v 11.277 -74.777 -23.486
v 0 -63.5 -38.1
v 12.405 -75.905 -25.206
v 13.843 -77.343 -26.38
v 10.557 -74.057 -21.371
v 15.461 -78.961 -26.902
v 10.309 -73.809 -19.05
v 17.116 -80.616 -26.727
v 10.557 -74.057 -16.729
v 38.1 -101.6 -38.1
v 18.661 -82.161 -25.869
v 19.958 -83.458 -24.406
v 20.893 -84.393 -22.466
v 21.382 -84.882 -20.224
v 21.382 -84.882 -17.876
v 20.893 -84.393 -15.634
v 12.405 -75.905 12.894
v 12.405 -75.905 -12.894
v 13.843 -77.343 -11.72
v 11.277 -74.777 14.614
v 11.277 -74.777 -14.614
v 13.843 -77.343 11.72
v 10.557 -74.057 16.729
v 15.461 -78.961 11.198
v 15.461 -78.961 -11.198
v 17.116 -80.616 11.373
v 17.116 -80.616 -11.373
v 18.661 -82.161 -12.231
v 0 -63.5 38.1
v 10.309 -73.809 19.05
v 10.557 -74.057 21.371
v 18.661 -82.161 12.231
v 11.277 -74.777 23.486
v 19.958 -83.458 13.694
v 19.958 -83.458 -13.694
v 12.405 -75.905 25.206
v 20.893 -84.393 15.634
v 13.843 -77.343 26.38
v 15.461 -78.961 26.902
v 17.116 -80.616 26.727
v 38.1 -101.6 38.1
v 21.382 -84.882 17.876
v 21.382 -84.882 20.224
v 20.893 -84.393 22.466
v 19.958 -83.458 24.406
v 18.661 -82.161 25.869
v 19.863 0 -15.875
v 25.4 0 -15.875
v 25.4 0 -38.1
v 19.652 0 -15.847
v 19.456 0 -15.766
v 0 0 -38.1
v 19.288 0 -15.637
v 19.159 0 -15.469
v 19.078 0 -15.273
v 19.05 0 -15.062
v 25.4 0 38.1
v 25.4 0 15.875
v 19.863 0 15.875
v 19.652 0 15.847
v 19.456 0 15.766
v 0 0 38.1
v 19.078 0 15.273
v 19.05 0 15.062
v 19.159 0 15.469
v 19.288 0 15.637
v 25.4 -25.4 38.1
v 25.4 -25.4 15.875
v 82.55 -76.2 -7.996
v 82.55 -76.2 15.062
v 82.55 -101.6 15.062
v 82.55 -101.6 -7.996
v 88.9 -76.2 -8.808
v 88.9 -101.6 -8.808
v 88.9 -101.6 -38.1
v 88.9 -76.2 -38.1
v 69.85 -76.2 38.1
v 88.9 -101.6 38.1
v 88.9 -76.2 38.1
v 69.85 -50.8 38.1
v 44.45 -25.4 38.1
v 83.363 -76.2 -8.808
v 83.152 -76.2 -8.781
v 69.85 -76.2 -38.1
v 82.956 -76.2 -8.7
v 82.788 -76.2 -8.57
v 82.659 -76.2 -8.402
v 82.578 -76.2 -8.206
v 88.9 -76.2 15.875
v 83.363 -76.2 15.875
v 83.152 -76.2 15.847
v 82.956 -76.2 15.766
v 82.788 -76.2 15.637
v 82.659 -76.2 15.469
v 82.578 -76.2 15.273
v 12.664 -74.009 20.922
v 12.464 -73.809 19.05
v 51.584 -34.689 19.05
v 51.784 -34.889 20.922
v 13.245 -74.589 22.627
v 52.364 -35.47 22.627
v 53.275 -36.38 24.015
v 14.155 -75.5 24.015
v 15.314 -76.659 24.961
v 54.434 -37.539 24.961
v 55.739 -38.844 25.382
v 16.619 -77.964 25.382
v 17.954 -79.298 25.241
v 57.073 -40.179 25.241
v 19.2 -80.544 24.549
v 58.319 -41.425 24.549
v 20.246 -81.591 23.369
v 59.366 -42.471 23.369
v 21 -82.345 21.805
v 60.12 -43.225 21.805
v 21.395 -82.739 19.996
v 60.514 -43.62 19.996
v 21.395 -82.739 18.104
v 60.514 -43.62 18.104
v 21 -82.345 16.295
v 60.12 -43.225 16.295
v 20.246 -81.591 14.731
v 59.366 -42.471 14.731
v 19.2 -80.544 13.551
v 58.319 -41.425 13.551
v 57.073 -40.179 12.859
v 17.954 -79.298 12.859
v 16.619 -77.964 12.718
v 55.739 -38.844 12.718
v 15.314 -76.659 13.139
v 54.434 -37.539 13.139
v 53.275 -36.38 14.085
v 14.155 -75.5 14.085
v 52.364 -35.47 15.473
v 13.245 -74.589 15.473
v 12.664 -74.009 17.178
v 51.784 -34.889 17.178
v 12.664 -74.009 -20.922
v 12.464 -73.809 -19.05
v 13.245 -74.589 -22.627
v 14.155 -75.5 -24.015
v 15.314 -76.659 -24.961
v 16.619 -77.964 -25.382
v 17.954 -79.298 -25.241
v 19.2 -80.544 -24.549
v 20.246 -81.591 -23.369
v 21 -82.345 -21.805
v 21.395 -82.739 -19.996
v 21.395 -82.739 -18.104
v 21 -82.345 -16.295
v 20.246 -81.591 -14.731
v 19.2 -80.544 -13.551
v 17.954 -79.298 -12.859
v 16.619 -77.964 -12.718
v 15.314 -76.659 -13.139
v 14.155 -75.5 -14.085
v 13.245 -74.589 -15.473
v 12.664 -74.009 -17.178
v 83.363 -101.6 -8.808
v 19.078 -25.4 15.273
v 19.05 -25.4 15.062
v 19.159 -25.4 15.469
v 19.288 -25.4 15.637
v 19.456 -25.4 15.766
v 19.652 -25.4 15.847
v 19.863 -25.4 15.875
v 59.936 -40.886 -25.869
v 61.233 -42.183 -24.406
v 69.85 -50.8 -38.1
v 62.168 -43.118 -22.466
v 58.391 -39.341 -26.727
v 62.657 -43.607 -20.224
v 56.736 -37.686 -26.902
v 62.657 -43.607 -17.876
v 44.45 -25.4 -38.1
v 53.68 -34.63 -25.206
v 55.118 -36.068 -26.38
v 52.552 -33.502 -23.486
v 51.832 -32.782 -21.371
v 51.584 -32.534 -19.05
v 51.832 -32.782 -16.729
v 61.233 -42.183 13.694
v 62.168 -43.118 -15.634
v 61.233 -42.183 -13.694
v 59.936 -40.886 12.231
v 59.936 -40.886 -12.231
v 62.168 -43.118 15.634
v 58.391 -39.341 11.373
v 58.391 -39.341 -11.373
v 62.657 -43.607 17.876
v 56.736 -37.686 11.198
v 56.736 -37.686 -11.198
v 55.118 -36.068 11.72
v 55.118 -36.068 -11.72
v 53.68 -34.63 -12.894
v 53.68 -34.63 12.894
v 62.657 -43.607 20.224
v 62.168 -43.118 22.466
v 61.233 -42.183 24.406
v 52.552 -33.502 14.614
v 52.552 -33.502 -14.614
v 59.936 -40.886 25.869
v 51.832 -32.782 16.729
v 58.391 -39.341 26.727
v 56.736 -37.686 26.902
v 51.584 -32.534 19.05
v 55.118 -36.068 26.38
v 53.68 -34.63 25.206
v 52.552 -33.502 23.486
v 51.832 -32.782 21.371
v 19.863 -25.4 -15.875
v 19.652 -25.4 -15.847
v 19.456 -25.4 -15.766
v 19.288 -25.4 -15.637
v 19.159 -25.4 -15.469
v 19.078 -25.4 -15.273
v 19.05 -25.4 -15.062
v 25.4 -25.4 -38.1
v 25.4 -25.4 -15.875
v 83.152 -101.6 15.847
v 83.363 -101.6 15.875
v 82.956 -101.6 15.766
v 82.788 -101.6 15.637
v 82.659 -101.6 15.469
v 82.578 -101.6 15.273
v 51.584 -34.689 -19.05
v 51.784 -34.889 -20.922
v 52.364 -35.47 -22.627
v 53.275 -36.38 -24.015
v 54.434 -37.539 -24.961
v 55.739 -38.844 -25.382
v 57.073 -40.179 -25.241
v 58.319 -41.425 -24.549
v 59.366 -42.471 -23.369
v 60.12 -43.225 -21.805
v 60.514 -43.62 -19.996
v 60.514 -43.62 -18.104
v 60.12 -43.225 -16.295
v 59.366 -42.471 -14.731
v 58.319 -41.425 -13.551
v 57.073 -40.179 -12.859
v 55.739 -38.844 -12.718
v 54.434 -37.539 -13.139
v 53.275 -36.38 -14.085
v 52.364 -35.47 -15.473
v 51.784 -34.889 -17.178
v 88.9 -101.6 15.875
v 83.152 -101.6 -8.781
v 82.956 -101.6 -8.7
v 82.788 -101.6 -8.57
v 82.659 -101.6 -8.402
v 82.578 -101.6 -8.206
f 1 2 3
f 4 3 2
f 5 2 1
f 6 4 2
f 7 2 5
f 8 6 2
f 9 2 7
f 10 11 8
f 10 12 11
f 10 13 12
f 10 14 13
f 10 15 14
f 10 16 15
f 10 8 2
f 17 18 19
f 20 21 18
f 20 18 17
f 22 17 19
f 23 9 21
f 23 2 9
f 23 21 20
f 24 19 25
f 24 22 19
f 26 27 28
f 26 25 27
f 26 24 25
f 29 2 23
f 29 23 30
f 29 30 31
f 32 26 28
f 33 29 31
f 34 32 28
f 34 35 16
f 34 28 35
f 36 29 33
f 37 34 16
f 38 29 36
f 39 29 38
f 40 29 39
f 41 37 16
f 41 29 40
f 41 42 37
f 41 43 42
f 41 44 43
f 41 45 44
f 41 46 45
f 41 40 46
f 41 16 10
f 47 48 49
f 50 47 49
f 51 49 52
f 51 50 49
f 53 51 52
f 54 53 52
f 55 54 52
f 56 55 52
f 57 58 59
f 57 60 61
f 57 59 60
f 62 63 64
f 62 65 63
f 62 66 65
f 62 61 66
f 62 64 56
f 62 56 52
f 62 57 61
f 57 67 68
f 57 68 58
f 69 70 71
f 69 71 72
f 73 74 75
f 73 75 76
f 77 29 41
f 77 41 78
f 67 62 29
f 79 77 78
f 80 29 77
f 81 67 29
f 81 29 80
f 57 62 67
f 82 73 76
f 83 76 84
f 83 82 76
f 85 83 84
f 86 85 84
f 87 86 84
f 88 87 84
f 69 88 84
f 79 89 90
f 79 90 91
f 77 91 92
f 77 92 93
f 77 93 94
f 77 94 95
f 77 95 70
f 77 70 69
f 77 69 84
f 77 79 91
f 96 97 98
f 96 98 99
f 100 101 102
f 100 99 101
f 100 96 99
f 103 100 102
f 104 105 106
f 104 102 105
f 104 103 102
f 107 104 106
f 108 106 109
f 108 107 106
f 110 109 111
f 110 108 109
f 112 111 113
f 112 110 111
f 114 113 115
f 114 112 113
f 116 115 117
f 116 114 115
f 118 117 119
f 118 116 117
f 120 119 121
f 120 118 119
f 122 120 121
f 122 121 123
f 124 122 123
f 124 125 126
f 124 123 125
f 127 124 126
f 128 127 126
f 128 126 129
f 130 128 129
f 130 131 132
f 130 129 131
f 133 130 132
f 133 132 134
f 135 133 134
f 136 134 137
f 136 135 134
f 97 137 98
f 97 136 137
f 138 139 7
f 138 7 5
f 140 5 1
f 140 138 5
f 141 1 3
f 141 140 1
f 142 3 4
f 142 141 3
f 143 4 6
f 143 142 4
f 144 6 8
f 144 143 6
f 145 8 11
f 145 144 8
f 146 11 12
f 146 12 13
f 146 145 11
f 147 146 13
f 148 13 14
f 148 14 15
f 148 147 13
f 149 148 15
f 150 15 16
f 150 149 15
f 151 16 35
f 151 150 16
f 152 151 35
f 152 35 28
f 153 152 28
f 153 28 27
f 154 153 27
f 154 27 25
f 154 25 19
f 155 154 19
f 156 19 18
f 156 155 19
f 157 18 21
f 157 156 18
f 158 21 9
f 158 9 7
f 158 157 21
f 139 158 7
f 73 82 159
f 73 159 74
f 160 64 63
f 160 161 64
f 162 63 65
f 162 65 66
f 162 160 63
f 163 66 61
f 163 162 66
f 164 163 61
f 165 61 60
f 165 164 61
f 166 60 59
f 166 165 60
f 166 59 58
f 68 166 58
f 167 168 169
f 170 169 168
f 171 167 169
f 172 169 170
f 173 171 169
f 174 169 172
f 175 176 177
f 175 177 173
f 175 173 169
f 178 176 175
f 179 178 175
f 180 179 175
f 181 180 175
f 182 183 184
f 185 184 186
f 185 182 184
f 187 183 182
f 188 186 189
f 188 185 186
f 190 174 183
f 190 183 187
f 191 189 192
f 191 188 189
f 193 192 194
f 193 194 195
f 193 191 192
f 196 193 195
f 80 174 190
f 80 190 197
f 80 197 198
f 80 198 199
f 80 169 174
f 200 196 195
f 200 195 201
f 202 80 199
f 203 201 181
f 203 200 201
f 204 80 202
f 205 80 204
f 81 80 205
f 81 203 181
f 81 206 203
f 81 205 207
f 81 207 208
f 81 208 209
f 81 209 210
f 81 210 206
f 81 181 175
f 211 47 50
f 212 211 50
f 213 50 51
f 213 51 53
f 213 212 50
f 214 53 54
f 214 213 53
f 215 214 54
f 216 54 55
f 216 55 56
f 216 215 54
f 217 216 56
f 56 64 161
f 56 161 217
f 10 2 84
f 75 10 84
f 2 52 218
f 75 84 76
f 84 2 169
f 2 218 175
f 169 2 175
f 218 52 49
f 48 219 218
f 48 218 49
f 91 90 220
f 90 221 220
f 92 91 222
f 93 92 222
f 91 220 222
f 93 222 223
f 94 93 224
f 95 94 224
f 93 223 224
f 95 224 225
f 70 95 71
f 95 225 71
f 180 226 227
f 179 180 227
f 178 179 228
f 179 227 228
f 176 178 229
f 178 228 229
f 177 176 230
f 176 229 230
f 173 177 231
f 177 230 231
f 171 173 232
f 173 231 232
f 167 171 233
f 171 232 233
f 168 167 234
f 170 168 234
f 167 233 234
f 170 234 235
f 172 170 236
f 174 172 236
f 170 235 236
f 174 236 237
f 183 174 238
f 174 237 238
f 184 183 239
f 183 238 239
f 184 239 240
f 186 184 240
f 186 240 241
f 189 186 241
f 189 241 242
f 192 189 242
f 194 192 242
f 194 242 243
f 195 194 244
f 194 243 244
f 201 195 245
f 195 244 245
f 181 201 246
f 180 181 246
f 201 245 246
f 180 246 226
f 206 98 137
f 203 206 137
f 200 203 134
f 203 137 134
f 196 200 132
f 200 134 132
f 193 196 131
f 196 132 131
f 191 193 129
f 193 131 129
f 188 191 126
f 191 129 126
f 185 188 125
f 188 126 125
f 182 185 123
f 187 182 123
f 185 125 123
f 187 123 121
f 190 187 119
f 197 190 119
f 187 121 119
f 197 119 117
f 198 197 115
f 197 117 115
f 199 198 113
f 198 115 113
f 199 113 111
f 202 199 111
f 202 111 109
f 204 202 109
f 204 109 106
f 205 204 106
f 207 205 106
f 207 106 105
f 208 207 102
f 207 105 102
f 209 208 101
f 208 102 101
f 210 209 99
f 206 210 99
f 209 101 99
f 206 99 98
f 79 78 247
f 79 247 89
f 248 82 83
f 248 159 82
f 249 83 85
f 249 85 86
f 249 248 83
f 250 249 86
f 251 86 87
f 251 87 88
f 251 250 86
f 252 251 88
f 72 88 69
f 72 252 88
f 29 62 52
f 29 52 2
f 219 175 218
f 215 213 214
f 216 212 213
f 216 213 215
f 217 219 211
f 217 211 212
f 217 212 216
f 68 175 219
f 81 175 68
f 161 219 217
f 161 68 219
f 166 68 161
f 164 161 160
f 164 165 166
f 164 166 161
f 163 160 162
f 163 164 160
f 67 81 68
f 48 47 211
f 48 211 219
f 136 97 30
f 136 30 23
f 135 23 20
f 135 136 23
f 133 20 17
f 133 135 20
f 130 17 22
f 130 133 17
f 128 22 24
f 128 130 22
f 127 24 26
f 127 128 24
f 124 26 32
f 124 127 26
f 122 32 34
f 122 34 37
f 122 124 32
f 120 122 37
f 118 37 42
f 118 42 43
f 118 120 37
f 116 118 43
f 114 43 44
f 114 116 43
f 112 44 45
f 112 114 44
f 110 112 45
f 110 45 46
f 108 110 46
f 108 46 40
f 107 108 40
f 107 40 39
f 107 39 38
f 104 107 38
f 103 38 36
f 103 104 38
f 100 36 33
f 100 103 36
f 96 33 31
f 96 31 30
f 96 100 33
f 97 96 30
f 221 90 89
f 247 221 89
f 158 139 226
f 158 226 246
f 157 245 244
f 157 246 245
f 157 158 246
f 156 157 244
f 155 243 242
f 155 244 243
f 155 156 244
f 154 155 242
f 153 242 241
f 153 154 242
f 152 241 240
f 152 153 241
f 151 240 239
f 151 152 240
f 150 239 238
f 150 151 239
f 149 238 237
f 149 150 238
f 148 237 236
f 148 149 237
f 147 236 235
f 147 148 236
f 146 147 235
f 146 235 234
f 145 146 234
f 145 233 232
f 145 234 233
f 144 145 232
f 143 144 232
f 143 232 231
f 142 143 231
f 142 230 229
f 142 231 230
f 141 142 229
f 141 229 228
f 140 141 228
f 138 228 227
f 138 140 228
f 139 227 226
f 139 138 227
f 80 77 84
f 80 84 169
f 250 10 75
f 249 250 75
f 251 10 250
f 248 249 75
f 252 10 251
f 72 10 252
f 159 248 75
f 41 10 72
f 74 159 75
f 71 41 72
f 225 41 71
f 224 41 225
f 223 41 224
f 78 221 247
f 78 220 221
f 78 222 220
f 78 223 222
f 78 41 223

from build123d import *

# Parameters (mm, degrees)
BOSS_EXTRUDE1_DEPTH     = 38.1
CUT_EXTRUDE1_DEPTH      = 142.777171117
CUT_EXTRUDE1_DEPTH_BACK = 142.777171117
SKETCH2_R               = 6.35
SKETCH3_W               = 6.35
SKETCH3_H               = 31.75
CUT_EXTRUDE2_DEPTH      = 25.4
SKETCH4_W               = 6.35
SKETCH4_H               = 24.683418283
CUT_EXTRUDE3_DEPTH      = 124.131068378
FILLET1_R               = 0.8128
CHAMFER1_SIZE           = 1.524


with BuildPart() as part:
    # Sketch1 → Boss-Extrude1 (new, symmetric)
    with BuildSketch(Plane.XY):
        Polygon((88.9, -101.6), (88.9, -76.2), (69.85, -76.2), (69.85, -50.8), (44.45, -25.4), (25.4, -25.4), (25.4, 0), (0, 0), (0, -63.5), (38.1, -101.6), align=None)
    extrude(amount=BOSS_EXTRUDE1_DEPTH, both=True)

    # Sketch2 → Cut-Extrude1 (cut, two sides: drawn at the far end of the back side and taken through both)
    with BuildSketch(Plane(origin=(9.525, 9.525, 0), x_dir=(0, 0, -1), z_dir=(0.7071067811865485, 0.7071067811865466, 0)).offset(-CUT_EXTRUDE1_DEPTH_BACK)):
        with Locations(Location((19.05, -67.35463315, 0), (0, 0, 90))):
            Circle(SKETCH2_R)
        with Locations(Location((-19.05, -67.35463315, 0), (0, 0, 90))):
            Circle(SKETCH2_R)
    extrude(amount=CUT_EXTRUDE1_DEPTH + CUT_EXTRUDE1_DEPTH_BACK, mode=Mode.SUBTRACT)

    # Sketch3 → Cut-Extrude2 (cut)
    with BuildSketch(Plane(origin=(0, 0, 0), x_dir=(1, 0, 0), z_dir=(0, 1, 0))):
        with Locations((22.225, 0)):
            Rectangle(SKETCH3_W, SKETCH3_H)
    extrude(amount=-CUT_EXTRUDE2_DEPTH, mode=Mode.SUBTRACT)

    # Sketch4 → Cut-Extrude3 (cut, through all)
    with BuildSketch(Plane(origin=(0, -76.2, 0), x_dir=(1, 0, 0), z_dir=(0, 1, 0))):
        with Locations((85.725, -3.533290859)):
            Rectangle(SKETCH4_W, SKETCH4_H)
    extrude(amount=-CUT_EXTRUDE3_DEPTH, mode=Mode.SUBTRACT)

    # Fillet1
    fillet1_edges = [part.edges().sort_by_distance(p)[0] for p in [
        (19.05, -12.7, 15.875),
        (19.05, -12.7, -15.875),
        (82.55, -88.9, 15.875),
        (82.55, -88.9, -8.808418283),
    ]]
    fillet(fillet1_edges, radius=FILLET1_R)

    # Chamfer1
    chamfer1_edges = [part.edges().sort_by_distance(p)[0] for p in [
        (61.642045905, -42.592045905, -19.05),
        (20.367045905, -83.867045905, -19.05),
        (61.642045905, -42.592045905, 19.05),
        (20.367045905, -83.867045905, 19.05),
    ]]
    chamfer(chamfer1_edges, length=CHAMFER1_SIZE)


solid = part.part
